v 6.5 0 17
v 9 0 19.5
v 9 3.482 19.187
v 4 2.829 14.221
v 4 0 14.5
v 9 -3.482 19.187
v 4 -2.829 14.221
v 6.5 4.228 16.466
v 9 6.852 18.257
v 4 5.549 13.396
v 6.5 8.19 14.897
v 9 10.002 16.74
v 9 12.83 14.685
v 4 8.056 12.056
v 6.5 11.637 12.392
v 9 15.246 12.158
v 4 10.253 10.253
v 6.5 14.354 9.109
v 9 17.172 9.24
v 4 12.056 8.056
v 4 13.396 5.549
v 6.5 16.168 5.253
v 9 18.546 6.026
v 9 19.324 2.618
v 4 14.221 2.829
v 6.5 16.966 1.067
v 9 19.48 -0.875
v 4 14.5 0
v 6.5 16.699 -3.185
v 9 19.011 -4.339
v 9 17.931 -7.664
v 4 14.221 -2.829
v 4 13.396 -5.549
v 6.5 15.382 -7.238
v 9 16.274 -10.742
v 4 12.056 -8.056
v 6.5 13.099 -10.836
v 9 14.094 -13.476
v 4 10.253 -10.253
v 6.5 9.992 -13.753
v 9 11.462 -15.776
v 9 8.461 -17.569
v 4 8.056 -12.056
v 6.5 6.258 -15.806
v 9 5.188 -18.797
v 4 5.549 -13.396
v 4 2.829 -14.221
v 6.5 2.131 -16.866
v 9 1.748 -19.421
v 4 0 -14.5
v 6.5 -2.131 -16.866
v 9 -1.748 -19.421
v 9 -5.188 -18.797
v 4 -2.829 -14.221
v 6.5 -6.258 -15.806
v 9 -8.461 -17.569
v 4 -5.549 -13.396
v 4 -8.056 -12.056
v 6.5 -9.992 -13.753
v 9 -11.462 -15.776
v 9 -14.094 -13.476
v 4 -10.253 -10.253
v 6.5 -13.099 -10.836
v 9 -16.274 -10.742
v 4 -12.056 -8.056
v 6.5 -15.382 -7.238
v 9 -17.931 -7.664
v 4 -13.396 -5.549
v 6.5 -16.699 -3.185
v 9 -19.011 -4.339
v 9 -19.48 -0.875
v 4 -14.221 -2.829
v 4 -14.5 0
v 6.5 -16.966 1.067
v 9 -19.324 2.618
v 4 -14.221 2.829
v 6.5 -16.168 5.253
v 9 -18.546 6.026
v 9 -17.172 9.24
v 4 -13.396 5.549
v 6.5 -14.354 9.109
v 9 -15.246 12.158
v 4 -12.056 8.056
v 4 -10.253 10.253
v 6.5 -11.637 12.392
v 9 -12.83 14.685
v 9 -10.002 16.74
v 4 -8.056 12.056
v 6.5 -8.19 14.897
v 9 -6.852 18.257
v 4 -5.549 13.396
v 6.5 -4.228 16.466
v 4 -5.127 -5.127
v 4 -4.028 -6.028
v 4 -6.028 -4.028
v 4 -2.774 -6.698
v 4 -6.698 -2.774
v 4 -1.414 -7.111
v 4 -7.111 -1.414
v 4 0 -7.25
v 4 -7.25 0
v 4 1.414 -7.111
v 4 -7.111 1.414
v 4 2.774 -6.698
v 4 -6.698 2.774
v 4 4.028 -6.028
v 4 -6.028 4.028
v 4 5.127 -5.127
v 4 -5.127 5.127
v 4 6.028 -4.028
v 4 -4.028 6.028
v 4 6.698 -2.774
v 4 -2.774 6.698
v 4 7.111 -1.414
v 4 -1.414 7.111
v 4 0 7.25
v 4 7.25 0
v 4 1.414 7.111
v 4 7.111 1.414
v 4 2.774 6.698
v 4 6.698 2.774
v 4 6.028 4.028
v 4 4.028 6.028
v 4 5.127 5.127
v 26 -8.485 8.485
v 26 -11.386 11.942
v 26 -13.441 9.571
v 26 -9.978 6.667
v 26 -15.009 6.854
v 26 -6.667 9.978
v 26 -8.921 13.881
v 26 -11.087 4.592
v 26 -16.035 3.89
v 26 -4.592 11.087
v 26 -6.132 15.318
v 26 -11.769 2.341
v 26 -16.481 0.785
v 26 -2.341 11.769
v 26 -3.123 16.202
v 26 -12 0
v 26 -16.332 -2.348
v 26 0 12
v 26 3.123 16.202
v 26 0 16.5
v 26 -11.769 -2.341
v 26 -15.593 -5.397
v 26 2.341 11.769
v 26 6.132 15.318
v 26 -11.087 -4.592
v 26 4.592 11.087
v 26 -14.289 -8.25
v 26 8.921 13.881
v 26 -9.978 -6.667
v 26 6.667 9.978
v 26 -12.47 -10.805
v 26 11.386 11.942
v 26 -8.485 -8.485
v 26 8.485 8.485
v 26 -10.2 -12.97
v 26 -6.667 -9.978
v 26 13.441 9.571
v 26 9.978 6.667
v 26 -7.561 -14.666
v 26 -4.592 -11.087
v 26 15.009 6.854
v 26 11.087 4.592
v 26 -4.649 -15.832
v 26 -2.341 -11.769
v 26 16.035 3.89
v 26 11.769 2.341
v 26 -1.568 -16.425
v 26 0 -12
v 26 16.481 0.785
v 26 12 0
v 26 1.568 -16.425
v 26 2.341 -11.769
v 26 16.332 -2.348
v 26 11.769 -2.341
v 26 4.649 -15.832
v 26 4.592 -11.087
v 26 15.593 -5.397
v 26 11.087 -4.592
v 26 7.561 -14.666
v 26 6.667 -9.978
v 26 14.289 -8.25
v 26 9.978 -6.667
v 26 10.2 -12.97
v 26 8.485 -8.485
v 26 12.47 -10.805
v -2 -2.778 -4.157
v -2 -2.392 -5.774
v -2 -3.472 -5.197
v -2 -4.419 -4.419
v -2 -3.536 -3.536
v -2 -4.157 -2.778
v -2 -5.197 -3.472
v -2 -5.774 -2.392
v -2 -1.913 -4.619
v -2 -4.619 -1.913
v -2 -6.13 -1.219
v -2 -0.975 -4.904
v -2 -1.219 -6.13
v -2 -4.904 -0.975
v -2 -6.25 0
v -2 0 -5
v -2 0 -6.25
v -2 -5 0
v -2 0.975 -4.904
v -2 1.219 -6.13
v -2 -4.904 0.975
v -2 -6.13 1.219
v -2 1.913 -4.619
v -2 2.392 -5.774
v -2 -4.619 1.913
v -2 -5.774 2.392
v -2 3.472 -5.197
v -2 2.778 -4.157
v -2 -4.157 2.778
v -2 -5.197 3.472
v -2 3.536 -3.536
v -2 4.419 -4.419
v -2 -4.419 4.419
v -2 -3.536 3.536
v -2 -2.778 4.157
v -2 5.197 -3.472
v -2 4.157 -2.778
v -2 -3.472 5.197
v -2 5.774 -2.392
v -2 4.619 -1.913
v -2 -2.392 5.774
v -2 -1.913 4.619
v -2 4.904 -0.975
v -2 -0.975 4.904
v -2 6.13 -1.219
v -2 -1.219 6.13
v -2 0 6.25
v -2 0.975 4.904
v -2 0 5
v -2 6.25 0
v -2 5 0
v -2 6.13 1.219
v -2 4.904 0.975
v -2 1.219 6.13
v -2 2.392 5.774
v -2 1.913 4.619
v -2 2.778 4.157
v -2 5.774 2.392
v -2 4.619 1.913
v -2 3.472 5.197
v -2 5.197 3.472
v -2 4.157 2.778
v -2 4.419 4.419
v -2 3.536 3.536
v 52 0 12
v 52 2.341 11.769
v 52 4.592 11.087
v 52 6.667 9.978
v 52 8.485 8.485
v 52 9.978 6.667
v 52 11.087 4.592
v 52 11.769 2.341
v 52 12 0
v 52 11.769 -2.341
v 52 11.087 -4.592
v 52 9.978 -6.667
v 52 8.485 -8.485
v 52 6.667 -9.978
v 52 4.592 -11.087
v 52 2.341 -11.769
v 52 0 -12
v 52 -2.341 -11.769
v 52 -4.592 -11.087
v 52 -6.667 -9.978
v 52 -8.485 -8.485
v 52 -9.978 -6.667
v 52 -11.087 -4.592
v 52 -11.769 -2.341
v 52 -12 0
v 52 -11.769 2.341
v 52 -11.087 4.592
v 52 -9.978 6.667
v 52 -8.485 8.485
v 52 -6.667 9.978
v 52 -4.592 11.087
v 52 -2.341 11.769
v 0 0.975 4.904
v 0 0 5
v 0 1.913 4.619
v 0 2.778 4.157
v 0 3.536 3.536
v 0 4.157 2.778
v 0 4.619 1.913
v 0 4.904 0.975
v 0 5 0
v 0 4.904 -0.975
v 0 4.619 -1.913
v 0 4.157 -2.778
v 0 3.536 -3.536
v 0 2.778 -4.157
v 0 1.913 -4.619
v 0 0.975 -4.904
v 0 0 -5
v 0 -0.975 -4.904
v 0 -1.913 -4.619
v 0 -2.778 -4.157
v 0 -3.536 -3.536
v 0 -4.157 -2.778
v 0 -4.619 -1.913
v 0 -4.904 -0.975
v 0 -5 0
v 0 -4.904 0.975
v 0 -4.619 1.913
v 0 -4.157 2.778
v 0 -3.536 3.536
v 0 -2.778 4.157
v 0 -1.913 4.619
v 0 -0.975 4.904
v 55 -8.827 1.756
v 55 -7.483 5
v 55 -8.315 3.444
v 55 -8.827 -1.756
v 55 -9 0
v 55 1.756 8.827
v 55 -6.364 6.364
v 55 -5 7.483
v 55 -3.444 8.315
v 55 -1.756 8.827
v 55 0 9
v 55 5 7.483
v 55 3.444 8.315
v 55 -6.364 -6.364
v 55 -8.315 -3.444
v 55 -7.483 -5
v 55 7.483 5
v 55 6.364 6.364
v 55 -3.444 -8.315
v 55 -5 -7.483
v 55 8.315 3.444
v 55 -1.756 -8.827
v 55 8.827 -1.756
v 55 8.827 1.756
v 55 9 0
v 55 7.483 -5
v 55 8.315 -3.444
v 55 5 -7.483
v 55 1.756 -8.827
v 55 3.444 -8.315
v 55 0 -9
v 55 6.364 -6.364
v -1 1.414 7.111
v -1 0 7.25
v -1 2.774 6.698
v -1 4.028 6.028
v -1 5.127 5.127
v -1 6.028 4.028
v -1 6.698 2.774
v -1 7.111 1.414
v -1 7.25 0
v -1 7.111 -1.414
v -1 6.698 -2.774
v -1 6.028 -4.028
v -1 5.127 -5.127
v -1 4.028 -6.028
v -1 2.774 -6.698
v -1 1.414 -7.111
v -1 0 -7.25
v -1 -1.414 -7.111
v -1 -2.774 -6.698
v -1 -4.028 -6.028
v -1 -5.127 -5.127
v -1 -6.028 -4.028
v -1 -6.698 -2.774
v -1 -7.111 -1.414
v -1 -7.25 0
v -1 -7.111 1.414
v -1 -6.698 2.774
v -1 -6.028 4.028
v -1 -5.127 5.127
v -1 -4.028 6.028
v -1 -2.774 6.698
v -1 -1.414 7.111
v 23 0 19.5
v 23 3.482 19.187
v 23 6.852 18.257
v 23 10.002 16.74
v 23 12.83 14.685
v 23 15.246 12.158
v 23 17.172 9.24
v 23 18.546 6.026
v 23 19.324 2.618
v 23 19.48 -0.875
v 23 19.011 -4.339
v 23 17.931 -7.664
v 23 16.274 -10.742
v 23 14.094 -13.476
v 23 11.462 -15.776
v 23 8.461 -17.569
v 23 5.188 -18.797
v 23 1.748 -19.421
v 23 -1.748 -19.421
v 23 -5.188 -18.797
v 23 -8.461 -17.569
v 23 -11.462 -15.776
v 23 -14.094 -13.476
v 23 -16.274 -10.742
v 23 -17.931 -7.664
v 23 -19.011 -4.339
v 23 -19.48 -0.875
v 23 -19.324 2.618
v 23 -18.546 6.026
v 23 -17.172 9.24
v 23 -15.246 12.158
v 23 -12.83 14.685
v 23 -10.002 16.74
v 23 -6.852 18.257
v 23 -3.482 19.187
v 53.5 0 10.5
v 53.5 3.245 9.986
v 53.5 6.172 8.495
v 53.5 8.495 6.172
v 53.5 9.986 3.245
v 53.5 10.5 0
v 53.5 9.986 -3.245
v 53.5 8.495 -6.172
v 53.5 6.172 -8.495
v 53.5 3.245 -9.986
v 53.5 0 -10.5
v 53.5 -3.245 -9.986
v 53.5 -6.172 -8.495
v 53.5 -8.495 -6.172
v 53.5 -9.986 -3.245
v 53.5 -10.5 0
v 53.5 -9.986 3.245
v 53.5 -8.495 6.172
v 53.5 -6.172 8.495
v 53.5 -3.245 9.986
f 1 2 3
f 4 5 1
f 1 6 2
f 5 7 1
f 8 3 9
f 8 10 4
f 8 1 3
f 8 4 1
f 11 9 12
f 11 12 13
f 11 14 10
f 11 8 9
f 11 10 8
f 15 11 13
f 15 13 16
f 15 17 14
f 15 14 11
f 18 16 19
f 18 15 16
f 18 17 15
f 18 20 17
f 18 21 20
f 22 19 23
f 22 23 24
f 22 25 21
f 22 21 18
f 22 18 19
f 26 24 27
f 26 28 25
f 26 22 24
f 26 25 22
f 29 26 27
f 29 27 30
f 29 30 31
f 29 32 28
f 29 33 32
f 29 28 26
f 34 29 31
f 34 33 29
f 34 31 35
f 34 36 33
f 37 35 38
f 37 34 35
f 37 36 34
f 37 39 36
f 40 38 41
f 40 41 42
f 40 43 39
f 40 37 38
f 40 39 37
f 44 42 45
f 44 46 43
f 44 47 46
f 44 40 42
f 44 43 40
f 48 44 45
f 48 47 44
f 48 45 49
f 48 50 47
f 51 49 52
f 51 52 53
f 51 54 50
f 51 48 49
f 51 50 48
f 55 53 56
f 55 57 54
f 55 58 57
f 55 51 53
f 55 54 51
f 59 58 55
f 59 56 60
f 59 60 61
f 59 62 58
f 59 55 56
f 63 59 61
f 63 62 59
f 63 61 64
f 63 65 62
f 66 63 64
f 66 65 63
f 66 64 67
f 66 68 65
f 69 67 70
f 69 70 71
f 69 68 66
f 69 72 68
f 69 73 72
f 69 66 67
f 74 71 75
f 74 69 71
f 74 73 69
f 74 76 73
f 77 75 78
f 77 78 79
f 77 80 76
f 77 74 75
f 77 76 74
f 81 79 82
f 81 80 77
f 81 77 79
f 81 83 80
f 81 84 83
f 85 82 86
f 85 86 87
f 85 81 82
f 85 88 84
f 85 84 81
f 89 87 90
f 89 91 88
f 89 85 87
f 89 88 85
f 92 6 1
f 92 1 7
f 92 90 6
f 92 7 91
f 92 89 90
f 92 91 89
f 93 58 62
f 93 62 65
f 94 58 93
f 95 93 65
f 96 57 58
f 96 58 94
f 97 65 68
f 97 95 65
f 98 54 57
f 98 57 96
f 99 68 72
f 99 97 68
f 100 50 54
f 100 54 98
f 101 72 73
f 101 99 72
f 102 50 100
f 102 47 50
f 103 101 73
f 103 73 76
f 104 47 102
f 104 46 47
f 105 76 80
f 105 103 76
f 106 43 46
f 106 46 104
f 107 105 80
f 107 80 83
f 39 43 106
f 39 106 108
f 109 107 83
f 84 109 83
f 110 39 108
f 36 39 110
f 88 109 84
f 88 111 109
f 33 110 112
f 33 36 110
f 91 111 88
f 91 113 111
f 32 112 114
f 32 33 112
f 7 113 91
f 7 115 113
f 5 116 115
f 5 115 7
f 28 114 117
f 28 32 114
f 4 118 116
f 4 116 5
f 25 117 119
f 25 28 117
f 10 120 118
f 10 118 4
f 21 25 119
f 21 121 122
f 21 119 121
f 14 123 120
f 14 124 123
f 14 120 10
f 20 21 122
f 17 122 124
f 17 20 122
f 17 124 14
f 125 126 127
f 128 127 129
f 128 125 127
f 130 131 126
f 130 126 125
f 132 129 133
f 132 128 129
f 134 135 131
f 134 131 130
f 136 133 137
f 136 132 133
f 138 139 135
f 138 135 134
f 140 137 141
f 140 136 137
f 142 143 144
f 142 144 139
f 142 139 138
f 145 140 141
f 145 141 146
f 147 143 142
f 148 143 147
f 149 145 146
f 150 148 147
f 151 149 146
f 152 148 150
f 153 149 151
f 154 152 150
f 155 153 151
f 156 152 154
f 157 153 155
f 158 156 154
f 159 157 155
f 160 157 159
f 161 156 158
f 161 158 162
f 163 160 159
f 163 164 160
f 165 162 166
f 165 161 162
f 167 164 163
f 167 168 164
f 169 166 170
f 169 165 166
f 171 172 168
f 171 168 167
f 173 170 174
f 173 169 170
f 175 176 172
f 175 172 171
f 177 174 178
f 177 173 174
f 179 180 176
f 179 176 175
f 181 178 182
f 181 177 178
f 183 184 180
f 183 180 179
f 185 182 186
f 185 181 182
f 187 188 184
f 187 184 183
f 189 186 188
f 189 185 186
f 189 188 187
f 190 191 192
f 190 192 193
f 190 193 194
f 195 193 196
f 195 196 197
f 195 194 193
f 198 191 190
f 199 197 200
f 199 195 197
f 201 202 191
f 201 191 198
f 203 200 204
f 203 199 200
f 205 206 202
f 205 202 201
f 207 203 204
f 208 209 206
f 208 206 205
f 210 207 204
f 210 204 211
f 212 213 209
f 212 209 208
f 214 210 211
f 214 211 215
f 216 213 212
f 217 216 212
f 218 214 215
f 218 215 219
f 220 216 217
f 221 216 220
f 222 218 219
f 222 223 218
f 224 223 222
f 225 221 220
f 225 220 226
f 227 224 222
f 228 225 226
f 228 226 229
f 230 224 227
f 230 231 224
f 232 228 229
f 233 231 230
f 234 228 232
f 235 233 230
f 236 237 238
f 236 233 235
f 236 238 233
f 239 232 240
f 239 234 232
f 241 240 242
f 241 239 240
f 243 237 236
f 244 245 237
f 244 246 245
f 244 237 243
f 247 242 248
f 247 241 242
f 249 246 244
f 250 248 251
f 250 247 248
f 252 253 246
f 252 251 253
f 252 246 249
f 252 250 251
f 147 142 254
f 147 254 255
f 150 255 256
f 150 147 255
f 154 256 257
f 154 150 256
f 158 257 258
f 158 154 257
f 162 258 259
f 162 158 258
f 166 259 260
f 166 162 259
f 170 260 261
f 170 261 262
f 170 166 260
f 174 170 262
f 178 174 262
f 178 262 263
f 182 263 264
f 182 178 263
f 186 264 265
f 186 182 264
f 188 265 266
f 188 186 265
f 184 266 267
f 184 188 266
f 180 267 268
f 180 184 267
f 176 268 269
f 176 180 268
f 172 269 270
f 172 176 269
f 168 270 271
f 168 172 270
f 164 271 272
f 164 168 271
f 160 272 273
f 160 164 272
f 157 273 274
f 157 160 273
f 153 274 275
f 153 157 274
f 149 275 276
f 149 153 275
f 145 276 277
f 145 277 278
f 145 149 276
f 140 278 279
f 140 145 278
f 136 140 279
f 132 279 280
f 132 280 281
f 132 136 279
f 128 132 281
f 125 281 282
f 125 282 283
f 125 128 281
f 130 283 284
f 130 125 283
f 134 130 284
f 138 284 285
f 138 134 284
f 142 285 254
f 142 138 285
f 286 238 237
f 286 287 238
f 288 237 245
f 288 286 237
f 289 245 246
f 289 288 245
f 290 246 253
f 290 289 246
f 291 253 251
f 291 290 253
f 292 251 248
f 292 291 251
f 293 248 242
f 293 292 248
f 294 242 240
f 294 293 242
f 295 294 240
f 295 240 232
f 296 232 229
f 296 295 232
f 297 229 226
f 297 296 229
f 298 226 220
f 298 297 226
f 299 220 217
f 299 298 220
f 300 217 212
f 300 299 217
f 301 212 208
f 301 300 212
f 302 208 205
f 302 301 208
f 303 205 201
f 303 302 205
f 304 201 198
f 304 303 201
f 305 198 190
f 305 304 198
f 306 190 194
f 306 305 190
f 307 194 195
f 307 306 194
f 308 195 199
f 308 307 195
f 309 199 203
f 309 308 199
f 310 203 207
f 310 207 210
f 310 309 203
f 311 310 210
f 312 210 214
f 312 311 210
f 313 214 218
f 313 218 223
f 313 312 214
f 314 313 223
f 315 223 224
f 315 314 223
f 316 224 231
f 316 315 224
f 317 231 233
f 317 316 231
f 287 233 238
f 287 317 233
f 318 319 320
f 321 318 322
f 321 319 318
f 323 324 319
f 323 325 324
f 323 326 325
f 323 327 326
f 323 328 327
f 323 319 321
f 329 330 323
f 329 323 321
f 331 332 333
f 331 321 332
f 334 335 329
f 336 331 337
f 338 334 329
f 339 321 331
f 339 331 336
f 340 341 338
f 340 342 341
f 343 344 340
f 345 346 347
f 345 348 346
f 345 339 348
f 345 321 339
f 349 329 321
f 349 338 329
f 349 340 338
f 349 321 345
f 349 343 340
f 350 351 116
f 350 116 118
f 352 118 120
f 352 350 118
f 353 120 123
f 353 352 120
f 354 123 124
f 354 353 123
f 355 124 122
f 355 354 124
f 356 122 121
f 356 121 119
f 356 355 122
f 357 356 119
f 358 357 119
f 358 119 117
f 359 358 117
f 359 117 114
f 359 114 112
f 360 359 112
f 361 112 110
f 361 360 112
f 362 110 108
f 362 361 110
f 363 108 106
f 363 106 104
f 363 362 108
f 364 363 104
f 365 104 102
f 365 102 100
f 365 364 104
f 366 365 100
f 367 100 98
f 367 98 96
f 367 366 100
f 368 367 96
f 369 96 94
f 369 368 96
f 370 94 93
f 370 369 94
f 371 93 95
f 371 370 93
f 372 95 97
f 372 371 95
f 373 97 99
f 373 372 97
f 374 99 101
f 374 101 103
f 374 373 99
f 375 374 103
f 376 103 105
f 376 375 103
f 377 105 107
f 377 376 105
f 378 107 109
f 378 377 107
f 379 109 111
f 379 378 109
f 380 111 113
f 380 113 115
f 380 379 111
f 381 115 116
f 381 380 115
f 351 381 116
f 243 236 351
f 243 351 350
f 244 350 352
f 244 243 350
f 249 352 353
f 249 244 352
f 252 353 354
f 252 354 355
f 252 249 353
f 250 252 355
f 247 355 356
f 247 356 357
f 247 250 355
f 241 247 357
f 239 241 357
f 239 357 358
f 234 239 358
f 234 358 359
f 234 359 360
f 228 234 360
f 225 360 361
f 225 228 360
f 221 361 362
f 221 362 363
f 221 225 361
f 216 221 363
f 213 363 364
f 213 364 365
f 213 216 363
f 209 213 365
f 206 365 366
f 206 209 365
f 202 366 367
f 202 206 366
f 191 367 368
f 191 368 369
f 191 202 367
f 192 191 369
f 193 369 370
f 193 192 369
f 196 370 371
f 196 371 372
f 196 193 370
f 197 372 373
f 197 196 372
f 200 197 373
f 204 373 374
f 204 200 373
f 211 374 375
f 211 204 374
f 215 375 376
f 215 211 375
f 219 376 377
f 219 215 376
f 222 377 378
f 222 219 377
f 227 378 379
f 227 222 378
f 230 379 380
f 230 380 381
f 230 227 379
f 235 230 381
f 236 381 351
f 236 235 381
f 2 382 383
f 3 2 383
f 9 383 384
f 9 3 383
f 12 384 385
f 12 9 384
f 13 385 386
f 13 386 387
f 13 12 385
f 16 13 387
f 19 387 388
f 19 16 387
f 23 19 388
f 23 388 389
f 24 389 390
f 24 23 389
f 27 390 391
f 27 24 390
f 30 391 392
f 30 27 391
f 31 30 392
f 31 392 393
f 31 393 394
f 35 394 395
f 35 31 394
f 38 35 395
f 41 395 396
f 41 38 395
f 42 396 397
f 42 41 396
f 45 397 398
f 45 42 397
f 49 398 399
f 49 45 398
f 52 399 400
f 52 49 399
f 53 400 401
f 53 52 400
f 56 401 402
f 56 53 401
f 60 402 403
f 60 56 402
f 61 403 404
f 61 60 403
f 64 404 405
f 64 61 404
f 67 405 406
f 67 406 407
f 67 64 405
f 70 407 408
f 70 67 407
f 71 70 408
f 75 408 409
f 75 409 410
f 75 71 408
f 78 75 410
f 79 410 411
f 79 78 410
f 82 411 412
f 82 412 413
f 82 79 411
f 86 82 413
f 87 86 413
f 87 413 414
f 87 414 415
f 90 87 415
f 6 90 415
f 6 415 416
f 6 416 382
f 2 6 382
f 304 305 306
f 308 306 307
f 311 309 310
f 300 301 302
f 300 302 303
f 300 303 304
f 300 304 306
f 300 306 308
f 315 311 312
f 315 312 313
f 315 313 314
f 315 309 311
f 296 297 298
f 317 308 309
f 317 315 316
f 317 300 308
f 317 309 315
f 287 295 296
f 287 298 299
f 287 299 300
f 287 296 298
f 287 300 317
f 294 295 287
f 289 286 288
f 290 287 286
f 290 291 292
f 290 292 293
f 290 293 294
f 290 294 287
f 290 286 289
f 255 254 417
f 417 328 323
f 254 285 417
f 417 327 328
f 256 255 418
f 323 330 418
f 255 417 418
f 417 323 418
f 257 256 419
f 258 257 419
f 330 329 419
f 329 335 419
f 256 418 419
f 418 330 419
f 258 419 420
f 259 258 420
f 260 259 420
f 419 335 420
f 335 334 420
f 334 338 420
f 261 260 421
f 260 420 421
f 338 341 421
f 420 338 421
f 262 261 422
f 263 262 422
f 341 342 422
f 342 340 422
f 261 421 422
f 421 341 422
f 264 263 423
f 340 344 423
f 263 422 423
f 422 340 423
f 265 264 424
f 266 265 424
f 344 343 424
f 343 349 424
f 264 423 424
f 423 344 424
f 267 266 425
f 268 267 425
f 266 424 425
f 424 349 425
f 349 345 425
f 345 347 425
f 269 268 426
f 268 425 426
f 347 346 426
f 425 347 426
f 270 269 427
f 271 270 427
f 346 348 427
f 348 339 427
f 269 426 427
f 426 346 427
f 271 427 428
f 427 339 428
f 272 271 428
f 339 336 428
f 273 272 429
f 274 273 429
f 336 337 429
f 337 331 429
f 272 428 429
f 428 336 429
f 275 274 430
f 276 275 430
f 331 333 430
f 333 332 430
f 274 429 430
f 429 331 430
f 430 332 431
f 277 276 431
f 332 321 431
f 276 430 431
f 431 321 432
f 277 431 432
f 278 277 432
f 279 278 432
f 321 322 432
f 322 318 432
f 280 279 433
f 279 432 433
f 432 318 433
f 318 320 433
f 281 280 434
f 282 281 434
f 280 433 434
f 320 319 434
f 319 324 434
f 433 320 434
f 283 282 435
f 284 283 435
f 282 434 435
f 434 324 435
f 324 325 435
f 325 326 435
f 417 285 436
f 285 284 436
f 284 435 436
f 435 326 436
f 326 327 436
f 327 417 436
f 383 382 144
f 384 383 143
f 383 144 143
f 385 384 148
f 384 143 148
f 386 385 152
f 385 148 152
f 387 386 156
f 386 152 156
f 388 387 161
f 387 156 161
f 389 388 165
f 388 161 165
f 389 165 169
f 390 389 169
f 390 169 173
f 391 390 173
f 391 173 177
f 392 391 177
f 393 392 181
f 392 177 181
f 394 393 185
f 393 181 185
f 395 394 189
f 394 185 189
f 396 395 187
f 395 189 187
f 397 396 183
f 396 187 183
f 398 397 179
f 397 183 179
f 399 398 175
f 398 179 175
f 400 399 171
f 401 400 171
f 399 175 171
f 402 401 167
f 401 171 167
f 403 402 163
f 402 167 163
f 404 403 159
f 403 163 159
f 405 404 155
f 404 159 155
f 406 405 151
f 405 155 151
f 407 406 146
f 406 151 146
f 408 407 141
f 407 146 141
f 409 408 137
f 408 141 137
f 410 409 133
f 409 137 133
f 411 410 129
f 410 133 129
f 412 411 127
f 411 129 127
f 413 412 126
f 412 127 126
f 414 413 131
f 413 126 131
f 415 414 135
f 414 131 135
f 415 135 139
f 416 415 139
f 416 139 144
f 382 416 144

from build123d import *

# Parameters (mm, degrees)
F2_SIZE = 5
F3_SIZE = 3
F4_SIZE = 1


with BuildPart() as f1:
    # F0 (on Front) → F1 (revolve)
    with BuildSketch(Plane.XZ):
        Polygon((0, 5), (0, 0), (55, 0), (55, 12), (26, 12), (26, 19.5), (4, 19.5), (4, 7.25), (-2, 7.25), (-2, 5), align=None)
    revolve(axis=Axis((27.5, 0, 0), (-1, 0, 0)))

    # F2
    f2_edges = [f1.edges().sort_by_distance(p)[0] for p in [
        (4, 0, -19.5),
    ]]
    chamfer(f2_edges, length=F2_SIZE)

    # F3
    f3_edges = [f1.edges().sort_by_distance(p)[0] for p in [
        (26, 0, -19.5),
        (55, 0, -12),
    ]]
    chamfer(f3_edges, length=F3_SIZE)

    # F4
    f4_edges = [f1.edges().sort_by_distance(p)[0] for p in [
        (-2, 0, -7.25),
    ]]
    chamfer(f4_edges, length=F4_SIZE)


solid = f1.part
